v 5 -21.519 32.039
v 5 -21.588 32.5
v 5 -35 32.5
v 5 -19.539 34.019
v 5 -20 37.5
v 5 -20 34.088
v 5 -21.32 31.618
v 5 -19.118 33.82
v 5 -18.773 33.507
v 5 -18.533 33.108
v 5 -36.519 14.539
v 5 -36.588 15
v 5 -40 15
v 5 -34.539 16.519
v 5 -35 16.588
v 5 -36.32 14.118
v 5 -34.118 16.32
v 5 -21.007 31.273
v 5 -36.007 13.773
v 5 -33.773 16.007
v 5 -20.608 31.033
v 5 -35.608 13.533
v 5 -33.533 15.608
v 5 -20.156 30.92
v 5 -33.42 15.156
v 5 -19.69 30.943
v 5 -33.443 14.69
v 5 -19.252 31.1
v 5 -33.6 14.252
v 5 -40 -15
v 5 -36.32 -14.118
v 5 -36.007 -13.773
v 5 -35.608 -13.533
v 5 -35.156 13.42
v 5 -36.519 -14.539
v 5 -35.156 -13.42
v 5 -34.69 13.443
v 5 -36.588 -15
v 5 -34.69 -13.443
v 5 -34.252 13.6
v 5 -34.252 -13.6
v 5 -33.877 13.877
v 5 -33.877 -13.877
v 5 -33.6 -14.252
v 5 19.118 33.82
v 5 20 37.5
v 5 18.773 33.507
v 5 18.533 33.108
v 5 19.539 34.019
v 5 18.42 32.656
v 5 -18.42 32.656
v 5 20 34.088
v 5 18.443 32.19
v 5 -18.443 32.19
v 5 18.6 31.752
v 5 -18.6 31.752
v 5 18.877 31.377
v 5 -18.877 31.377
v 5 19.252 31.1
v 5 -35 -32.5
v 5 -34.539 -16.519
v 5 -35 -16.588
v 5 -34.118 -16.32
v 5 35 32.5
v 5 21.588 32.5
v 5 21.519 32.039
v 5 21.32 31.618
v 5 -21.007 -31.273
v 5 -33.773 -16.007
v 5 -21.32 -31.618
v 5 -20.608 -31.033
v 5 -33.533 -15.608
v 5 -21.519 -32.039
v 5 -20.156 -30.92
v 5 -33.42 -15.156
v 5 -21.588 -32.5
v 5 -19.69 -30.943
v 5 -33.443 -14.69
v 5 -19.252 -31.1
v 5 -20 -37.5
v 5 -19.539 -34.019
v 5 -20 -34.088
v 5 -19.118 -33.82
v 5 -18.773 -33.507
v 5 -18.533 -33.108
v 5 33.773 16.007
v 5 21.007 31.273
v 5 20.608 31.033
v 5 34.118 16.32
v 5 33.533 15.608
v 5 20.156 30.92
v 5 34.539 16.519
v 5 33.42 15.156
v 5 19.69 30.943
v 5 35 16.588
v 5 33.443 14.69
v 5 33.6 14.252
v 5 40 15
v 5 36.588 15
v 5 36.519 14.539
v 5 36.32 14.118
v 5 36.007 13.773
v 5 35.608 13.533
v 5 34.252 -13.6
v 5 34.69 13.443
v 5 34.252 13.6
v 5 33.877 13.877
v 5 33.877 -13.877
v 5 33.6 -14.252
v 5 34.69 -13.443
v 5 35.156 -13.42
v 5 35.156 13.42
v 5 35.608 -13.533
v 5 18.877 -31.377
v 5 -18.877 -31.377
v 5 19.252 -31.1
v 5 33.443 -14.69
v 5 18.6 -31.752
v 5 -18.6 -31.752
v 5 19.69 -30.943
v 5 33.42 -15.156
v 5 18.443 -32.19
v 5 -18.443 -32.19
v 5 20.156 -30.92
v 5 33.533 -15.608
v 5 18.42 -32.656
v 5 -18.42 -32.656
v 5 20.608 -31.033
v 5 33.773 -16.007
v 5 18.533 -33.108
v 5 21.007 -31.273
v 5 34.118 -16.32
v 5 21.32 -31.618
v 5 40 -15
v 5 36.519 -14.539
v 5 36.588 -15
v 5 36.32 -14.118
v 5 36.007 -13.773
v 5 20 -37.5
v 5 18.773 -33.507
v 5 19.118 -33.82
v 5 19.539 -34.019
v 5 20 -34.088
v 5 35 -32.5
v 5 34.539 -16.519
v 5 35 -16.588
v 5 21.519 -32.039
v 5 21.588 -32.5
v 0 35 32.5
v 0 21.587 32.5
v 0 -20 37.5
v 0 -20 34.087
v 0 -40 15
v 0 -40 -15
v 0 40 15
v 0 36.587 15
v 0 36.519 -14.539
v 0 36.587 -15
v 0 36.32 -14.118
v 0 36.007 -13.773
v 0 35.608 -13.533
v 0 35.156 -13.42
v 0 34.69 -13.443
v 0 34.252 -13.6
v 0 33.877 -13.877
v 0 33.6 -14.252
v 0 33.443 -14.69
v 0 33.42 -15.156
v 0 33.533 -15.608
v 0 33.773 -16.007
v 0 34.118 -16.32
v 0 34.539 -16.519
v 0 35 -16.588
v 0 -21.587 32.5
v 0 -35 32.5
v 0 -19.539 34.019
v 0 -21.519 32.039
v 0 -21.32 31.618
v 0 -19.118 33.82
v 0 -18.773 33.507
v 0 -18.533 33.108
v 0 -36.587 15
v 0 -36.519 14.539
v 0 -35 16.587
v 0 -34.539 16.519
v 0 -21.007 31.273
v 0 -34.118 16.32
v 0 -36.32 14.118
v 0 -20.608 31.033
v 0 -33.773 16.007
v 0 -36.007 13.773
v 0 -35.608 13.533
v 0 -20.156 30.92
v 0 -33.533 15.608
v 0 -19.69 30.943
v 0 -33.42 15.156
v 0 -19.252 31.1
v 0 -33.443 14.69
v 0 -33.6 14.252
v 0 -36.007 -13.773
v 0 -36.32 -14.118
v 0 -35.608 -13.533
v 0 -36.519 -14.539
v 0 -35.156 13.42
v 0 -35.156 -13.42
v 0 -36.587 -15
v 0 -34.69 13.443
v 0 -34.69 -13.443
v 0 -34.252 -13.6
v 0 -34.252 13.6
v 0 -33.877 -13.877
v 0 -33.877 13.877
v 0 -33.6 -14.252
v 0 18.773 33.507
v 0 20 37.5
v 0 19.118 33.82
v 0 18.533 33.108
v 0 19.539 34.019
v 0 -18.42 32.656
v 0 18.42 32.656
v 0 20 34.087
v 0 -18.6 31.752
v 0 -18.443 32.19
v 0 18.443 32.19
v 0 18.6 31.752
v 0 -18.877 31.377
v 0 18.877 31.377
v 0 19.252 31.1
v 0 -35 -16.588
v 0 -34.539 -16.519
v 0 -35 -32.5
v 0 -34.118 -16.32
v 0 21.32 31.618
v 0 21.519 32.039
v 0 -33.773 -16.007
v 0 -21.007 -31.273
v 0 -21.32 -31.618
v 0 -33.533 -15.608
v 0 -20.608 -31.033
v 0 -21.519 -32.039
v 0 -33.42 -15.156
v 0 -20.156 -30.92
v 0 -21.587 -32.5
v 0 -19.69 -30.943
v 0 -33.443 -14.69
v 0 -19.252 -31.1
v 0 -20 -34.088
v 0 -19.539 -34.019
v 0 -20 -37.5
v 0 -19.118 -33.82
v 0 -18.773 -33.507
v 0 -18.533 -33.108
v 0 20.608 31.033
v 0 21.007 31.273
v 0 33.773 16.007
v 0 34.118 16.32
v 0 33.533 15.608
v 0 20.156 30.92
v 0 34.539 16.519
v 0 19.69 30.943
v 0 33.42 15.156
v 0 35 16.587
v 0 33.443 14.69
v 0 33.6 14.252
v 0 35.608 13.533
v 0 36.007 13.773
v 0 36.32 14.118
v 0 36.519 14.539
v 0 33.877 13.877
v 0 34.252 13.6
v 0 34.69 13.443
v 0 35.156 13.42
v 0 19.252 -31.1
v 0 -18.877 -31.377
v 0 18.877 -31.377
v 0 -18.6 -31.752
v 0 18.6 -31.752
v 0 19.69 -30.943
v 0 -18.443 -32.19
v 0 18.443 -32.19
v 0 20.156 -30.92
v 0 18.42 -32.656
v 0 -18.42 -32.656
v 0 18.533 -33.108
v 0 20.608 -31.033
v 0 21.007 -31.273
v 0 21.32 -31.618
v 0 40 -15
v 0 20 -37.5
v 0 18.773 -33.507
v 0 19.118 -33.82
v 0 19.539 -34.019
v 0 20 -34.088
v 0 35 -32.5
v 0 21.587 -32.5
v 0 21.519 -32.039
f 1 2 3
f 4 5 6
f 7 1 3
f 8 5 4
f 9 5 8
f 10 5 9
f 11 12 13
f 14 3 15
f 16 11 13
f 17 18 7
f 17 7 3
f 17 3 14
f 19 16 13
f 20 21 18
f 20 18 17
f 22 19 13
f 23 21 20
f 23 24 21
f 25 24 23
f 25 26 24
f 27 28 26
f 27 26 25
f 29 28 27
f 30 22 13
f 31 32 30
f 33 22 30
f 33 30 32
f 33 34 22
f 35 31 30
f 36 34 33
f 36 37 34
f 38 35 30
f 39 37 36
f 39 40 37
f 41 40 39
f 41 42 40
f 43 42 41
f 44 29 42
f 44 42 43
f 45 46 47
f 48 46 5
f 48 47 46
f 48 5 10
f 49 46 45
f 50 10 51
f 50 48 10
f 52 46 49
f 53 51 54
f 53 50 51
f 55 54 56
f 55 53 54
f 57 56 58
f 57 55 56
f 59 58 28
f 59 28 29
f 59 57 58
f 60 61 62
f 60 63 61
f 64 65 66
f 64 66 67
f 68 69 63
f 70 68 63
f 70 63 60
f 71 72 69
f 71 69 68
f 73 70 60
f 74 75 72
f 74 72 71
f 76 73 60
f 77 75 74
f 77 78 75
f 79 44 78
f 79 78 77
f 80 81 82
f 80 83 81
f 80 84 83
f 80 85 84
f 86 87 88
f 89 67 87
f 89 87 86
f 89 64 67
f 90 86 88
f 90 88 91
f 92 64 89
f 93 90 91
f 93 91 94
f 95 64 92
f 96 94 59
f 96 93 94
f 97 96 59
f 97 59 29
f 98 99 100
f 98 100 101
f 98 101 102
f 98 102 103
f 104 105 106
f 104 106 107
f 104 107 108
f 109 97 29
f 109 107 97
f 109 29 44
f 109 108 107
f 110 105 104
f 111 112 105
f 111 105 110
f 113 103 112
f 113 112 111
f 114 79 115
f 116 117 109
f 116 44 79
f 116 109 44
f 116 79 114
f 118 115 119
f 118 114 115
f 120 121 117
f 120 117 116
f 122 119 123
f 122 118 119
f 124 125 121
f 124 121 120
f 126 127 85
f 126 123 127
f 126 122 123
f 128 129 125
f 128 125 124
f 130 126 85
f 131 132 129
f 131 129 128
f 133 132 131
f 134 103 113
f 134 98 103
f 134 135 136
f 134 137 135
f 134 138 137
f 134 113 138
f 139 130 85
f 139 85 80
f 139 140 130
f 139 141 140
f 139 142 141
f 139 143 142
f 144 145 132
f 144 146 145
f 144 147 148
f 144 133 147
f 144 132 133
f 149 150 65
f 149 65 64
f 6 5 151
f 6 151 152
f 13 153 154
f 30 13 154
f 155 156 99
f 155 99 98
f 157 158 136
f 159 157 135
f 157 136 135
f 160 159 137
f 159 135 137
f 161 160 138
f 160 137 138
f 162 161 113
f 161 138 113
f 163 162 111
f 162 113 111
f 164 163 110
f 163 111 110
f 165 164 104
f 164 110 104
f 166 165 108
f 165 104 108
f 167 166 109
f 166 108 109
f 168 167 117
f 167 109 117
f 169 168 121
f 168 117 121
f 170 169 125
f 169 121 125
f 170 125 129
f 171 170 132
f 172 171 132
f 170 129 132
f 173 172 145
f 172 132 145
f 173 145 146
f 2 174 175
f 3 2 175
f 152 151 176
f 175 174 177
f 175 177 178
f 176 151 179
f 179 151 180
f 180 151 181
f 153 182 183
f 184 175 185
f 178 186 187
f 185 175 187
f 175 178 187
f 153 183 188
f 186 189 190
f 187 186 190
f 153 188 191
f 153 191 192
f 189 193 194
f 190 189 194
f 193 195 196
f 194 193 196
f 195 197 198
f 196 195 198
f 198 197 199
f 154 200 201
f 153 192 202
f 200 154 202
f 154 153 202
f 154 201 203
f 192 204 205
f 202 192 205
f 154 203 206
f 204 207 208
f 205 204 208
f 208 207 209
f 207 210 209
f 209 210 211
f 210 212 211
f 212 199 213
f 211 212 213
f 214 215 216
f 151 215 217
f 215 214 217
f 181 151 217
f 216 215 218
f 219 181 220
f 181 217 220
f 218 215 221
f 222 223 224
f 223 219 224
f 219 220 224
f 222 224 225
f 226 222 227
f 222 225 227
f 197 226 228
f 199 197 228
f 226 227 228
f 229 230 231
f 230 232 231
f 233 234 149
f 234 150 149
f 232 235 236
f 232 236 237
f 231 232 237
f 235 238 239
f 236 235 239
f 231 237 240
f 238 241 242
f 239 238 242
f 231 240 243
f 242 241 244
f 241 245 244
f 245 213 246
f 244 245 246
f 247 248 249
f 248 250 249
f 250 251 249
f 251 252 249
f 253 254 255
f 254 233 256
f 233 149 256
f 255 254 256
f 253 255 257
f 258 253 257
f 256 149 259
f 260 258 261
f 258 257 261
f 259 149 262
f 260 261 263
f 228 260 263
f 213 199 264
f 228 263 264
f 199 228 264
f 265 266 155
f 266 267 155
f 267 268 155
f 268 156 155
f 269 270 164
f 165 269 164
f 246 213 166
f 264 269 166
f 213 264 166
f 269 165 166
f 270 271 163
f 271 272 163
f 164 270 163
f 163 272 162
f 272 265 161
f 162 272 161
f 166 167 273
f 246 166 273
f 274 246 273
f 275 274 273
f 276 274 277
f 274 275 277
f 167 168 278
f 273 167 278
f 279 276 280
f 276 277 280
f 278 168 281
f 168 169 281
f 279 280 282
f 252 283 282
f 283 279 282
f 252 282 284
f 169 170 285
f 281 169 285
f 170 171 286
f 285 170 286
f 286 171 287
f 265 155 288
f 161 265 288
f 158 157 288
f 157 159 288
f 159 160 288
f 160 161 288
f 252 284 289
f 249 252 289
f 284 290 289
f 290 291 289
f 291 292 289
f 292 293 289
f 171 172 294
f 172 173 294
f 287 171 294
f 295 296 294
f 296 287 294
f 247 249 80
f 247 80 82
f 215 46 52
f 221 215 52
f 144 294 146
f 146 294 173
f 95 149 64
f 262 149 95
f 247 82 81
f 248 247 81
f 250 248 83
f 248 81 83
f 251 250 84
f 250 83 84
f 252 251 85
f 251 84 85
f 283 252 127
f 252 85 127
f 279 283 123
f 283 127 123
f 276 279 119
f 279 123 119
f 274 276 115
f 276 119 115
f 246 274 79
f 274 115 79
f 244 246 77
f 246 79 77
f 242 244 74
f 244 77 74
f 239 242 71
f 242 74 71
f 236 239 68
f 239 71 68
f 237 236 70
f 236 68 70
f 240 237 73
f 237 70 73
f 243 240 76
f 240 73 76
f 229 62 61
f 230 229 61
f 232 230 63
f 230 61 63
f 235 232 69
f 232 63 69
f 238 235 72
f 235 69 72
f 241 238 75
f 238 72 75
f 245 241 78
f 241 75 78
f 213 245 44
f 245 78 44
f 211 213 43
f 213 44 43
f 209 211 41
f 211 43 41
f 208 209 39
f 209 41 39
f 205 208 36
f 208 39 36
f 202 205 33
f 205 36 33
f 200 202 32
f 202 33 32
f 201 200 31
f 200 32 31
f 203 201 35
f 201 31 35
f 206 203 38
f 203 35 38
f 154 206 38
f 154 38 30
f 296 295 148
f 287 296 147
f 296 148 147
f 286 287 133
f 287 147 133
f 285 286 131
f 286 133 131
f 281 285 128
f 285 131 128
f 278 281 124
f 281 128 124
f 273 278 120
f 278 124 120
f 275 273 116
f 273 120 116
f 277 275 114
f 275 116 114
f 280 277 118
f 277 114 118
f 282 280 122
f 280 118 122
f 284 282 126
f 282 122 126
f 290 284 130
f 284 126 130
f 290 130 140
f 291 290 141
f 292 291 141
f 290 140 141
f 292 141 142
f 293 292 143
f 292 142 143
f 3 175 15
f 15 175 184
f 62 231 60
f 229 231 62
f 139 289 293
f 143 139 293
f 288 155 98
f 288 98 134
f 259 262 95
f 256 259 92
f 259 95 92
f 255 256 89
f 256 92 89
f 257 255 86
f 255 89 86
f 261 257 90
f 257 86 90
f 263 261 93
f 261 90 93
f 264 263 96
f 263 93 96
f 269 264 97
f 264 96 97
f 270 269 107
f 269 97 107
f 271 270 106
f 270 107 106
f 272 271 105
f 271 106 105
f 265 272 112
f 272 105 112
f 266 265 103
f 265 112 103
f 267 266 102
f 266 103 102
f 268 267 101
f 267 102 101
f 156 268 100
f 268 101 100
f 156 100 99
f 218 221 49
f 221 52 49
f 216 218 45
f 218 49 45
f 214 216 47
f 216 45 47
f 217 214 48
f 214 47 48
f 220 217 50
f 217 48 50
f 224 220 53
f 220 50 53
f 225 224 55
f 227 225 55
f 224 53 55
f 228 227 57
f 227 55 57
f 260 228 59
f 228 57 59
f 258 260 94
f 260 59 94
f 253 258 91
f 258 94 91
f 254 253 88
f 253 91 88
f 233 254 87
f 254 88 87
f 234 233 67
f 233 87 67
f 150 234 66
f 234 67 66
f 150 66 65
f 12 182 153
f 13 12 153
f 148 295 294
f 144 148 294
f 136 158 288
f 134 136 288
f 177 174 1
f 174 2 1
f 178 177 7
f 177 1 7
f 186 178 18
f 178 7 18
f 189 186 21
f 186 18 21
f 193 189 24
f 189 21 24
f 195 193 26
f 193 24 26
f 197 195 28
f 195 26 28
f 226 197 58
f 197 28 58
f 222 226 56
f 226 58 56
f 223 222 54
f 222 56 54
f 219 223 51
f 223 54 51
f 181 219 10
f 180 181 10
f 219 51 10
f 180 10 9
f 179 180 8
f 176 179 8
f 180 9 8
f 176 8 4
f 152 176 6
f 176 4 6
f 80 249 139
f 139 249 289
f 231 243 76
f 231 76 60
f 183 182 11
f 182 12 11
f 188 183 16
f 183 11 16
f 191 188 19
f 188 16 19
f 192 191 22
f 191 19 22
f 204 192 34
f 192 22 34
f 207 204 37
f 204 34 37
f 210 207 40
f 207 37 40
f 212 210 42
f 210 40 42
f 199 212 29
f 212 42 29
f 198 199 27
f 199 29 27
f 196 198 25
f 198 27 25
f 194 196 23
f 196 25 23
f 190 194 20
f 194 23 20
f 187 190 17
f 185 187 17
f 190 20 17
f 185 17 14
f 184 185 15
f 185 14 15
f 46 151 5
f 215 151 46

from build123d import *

# Parameters (mm, degrees)
SKETCH1_W                                = 75
SKETCH1_H                                = 80
BOSS_EXTRUDE1_DEPTH                      = 5
CUT_EXTRUDE1_START                       = -6
CUT_EXTRUDE1_DEPTH                       = 7
MIRROR1_START                            = -6
MIRROR1_AT_THE_SECOND_PLANE_COPY_1_DEPTH = 7
SKETCH4_R                                = 1.5875
CUT_EXTRUDE2_DEPTH                       = 6


with BuildPart() as part:
    # Sketch1 → Boss-Extrude1 (new body)
    with BuildSketch(Plane(origin=(0, 0, 0), x_dir=(0, 0, -1), z_dir=(1, 0, 0))):
        Rectangle(SKETCH1_W, SKETCH1_H)
    extrude(amount=BOSS_EXTRUDE1_DEPTH)

    # Sketch3 → Cut-Extrude1 (cut)
    with BuildSketch(Plane(origin=(5, 0, 0), x_dir=(0, 0, -1), z_dir=(1, 0, 0)).offset(CUT_EXTRUDE1_START)):
        Polygon((-37.5, 20), (-32.5, 20), (-32.5, 35), (-15, 35), (-15, 40), (-37.5, 40), align=None)
    cut_extrude1 = extrude(amount=CUT_EXTRUDE1_DEPTH, mode=Mode.SUBTRACT)

    # Mirror1: Cut-Extrude1 across plane
    add(cut_extrude1.mirror(Plane.XY), mode=Mode.SUBTRACT)

    # Mirror1 at the second plane: Cut-Extrude1 across plane
    add(cut_extrude1.mirror(Plane.ZX), mode=Mode.SUBTRACT)

    # Mirror1 at the second plane copy 1 sketc → Mirror1 at the second plane copy 1 (cut)
    with BuildSketch(Plane(origin=(5, 0, 0), x_dir=(0, 0, 1), z_dir=(1, 0, 0)).offset(MIRROR1_START)):
        Polygon((-37.5, 20), (-32.5, 20), (-32.5, 35), (-15, 35), (-15, 40), (-37.5, 40), align=None)
    extrude(amount=MIRROR1_AT_THE_SECOND_PLANE_COPY_1_DEPTH, mode=Mode.SUBTRACT)

    # Sketch4 → Cut-Extrude2 (cut, through all)
    with BuildSketch(Plane(origin=(5, 0, 0), x_dir=(0, 0, -1), z_dir=(1, 0, 0))):
        with Locations((-15, 35)):
            Circle(SKETCH4_R)
        with Locations((15, 35)):
            Circle(SKETCH4_R)
        with Locations((32.5, 20)):
            Circle(SKETCH4_R)
        with Locations((32.5, -20)):
            Circle(SKETCH4_R)
        with Locations((15, -35)):
            Circle(SKETCH4_R)
        with Locations((-15, -35)):
            Circle(SKETCH4_R)
        with Locations((-32.5, -20)):
            Circle(SKETCH4_R)
        with Locations((-32.5, 20)):
            Circle(SKETCH4_R)
    extrude(amount=-CUT_EXTRUDE2_DEPTH, mode=Mode.SUBTRACT)


solid = part.part
